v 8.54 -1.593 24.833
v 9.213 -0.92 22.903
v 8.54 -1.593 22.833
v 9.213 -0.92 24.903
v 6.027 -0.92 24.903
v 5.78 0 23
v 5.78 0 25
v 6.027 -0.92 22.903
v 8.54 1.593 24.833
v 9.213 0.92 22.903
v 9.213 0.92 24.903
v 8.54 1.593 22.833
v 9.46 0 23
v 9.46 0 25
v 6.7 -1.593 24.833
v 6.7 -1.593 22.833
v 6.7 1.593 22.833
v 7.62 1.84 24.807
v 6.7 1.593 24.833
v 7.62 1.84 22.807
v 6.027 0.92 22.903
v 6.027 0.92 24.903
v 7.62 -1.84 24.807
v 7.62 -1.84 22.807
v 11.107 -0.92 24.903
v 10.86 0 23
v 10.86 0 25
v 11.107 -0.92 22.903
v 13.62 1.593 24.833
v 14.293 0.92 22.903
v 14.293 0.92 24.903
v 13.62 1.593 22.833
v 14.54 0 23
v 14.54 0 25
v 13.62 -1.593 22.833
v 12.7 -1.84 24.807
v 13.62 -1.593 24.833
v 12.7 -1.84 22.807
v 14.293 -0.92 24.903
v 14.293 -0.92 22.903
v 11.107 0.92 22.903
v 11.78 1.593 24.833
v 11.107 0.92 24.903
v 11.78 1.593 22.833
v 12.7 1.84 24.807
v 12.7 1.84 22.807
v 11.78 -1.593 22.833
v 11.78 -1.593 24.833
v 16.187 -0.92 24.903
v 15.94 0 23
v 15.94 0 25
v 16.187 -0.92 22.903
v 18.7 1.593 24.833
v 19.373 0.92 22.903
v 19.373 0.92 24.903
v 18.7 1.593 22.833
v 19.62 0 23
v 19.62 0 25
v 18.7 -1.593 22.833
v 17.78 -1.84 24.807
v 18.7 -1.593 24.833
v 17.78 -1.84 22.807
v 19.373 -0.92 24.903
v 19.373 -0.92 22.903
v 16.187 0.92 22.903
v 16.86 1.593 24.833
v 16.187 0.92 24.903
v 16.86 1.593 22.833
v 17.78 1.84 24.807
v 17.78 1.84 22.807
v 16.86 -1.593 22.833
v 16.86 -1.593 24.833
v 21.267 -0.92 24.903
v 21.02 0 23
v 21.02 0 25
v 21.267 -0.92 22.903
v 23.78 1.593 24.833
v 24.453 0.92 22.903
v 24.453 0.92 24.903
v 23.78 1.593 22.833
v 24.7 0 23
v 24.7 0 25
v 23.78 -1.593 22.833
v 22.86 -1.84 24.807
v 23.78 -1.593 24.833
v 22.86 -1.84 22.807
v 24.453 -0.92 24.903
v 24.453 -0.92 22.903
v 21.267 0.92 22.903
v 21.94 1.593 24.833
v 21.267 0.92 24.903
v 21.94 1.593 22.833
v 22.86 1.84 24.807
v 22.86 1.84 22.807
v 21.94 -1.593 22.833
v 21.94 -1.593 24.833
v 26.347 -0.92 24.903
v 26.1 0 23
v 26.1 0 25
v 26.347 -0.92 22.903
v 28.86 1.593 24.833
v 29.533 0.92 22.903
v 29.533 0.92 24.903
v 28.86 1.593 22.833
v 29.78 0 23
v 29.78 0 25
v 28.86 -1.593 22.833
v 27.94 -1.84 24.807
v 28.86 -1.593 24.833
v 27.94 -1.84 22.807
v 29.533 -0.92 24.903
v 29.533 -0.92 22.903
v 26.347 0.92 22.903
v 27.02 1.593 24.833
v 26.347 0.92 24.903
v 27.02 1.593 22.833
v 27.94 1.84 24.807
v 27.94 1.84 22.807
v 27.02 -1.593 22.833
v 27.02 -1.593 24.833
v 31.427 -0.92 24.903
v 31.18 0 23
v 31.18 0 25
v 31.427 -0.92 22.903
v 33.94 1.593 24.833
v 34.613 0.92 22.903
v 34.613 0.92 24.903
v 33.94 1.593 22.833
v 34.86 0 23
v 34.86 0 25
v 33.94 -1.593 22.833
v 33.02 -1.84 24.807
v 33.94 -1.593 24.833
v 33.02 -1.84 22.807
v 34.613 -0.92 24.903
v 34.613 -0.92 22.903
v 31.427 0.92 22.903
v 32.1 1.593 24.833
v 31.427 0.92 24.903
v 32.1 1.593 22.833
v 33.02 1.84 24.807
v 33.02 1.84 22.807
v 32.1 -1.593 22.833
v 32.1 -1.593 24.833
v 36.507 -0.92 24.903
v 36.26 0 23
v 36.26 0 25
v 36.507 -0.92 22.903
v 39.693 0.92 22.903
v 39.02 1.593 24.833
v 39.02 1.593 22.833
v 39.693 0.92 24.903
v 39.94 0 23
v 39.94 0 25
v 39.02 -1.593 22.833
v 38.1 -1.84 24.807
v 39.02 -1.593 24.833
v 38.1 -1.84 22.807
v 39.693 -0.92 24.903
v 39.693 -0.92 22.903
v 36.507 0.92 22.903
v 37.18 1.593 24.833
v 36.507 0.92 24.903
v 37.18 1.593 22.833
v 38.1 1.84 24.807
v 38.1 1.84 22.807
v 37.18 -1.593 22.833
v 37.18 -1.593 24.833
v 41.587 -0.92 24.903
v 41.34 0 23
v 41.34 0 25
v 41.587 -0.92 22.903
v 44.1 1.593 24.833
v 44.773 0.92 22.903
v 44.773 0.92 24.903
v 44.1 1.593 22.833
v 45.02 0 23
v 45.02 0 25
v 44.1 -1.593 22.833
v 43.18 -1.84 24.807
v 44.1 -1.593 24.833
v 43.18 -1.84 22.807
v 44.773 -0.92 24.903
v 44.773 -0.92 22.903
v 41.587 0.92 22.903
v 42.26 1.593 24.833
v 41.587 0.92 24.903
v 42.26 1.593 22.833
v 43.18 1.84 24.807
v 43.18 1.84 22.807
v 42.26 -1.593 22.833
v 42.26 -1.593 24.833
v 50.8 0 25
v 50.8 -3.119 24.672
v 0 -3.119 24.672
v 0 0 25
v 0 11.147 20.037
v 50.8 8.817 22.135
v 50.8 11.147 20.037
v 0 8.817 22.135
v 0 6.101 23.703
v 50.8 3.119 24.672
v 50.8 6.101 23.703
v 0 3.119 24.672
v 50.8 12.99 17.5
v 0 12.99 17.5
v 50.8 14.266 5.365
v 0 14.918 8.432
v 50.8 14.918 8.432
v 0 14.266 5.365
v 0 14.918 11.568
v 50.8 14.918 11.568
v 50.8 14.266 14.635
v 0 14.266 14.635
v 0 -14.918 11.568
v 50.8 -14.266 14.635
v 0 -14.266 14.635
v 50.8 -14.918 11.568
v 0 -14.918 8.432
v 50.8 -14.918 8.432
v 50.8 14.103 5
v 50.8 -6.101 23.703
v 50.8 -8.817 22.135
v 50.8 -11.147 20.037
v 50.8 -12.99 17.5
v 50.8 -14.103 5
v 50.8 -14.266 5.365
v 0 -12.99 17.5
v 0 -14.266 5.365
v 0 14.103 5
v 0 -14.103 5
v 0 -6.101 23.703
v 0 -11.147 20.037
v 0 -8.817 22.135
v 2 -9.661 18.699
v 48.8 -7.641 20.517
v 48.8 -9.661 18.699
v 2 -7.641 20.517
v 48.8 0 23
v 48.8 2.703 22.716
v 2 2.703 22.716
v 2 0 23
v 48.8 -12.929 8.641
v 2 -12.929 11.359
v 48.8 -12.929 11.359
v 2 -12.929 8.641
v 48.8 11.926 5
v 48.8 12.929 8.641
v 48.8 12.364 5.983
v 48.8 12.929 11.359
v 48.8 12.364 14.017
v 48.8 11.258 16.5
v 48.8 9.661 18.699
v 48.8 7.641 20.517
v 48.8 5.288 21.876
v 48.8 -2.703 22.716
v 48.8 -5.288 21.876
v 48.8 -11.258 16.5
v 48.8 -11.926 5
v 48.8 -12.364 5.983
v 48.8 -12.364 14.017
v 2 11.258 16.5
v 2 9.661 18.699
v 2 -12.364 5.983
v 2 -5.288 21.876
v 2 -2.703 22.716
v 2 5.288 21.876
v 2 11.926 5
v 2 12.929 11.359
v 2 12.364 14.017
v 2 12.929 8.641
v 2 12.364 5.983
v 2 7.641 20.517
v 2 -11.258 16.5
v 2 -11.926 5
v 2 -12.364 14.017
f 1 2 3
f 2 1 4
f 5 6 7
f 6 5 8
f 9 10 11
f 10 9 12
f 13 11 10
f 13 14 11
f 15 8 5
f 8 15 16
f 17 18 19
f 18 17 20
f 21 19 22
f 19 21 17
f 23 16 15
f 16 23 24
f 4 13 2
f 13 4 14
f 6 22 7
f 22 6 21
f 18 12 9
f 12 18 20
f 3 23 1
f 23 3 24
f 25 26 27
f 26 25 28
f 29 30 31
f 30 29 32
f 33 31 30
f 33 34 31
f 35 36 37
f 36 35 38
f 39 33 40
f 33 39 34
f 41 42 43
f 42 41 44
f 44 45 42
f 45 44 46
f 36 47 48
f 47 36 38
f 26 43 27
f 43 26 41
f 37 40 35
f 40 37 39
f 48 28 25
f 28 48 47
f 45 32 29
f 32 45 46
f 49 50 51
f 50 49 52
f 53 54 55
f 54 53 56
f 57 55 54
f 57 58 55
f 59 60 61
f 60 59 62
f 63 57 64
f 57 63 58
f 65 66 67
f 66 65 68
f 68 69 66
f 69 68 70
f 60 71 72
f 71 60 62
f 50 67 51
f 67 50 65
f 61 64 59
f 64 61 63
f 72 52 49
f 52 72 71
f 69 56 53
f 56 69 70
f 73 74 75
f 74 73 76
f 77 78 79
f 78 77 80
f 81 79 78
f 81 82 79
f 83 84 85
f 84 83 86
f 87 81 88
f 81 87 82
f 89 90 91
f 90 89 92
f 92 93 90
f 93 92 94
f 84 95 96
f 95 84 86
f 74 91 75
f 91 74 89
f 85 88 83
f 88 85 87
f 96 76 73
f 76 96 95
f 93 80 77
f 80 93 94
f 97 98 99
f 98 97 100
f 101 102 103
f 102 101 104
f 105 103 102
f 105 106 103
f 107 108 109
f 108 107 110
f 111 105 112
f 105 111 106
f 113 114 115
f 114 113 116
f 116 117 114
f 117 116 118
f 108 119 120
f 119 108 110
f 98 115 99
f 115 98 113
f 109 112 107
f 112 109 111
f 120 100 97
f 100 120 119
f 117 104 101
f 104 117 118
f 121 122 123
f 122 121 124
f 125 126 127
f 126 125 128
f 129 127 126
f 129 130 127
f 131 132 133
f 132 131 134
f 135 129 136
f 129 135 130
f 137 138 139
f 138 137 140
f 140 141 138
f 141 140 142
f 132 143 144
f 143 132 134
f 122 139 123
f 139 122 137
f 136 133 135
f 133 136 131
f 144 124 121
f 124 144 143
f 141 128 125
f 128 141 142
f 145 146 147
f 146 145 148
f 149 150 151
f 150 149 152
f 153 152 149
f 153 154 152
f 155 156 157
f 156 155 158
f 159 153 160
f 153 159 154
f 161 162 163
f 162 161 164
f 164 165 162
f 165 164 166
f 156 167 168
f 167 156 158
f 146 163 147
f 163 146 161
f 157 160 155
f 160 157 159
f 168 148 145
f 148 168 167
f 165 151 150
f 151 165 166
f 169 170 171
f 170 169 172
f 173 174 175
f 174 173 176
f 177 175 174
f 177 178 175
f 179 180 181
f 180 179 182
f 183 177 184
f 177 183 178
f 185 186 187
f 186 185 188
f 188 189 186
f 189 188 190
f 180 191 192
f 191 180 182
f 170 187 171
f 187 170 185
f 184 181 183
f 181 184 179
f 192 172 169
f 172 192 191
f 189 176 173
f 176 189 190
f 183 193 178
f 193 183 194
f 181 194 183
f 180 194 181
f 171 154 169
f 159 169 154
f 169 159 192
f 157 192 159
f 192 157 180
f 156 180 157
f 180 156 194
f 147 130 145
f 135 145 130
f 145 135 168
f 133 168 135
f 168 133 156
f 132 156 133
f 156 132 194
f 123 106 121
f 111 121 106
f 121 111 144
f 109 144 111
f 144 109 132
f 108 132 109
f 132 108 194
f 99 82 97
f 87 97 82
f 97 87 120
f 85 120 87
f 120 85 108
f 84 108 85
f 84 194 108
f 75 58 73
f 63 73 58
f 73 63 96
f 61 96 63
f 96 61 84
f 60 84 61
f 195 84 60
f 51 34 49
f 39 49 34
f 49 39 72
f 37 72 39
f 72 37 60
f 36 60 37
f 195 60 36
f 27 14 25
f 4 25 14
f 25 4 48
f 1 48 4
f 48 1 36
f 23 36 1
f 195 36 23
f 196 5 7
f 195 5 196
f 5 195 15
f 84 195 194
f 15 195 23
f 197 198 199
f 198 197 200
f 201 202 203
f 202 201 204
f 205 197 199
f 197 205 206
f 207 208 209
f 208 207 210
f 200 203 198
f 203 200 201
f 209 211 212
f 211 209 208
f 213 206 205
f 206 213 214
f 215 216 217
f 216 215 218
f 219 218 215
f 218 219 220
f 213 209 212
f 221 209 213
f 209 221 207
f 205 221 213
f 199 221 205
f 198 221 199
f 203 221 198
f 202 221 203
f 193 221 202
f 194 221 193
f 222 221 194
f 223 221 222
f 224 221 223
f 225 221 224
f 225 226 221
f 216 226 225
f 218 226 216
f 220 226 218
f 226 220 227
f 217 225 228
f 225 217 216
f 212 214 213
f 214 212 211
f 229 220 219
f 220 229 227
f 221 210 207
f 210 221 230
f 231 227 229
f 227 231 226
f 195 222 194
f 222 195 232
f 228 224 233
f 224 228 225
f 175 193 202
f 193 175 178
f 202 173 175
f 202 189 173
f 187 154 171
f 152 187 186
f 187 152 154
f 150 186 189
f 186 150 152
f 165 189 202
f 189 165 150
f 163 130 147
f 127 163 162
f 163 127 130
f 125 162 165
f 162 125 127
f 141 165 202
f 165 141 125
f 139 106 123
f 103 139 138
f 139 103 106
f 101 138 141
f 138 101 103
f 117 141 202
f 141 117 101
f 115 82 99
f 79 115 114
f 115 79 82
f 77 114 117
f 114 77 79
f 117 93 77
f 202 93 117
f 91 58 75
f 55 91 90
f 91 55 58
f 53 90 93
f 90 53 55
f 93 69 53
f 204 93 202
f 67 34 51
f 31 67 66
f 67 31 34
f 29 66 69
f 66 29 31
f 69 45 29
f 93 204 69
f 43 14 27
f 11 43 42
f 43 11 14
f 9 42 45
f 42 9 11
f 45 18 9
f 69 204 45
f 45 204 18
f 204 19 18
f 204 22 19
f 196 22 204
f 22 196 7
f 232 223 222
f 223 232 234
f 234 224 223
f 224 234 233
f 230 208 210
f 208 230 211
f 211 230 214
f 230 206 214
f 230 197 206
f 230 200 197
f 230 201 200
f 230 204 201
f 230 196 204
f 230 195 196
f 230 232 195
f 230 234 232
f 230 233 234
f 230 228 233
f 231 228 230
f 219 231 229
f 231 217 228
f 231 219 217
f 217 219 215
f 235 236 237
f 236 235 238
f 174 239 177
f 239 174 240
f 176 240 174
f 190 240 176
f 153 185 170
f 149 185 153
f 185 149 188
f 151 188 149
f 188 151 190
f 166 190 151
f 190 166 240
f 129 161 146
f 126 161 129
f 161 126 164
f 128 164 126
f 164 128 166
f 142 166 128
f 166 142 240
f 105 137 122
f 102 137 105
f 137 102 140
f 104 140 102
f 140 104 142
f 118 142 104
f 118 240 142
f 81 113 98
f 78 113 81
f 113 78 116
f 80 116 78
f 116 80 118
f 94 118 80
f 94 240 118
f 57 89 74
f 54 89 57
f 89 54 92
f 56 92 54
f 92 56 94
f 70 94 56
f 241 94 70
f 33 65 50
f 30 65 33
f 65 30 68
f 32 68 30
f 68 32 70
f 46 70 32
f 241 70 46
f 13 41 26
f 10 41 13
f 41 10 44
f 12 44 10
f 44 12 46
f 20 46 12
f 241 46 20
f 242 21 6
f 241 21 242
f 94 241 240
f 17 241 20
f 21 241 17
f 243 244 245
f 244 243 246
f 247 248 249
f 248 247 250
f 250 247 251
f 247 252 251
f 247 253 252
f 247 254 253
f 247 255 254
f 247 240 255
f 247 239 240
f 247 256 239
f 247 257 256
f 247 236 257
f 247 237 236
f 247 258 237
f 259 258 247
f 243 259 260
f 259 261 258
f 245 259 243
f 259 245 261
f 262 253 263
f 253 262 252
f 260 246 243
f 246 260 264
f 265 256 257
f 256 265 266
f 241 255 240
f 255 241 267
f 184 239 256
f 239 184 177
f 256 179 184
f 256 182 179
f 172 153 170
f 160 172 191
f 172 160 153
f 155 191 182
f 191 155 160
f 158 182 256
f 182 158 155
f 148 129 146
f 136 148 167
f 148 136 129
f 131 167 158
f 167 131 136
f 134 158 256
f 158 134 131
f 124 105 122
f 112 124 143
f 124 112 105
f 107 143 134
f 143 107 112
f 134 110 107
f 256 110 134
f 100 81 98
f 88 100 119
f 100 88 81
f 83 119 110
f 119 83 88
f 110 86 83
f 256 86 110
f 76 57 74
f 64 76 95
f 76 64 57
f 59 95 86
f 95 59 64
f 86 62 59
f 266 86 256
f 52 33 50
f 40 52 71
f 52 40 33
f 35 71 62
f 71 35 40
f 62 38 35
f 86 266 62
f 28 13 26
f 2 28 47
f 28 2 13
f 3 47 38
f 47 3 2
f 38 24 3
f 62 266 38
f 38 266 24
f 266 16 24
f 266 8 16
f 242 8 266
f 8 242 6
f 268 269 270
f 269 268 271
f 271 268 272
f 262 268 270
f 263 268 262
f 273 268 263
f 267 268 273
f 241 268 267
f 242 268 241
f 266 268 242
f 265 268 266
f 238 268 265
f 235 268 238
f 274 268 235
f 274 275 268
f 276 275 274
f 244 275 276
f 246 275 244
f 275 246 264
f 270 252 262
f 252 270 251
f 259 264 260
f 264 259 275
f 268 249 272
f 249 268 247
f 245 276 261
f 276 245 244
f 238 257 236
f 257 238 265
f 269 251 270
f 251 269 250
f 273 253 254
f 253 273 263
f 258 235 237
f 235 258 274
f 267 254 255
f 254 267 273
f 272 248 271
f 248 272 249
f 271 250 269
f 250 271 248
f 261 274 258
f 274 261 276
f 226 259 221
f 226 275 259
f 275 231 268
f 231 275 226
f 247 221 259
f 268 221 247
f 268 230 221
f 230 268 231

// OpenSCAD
/*
    Housing for leds and controller
*/

hob_radius = 1.84;
hob_spacing = 5.08;

hobs_wide = 8;
hobs_deep = 1;

module led_matrix(wide,deep) {
    height = 5;

    union() {
        for (i = [1 : wide]) {
            for (j = [1 : deep]) {
                translate([i*hob_spacing, j*hob_spacing, 0])
                cylinder(r1 = hob_radius,r2 = hob_radius,$fn = 12,h = height, center=false);
            }
        }

    };
};

case_width = 30;
case_length = (hobs_wide+2)*hob_spacing;
case_thick = 2;
case_slice = case_width / 3;

difference() {
    translate([0,0,case_width/3])
    rotate([0,90,0])
        cylinder(h=case_length, r = case_width/2);
    translate([2,0,case_width/3])
    rotate([0,90,0])
        cylinder(h=case_length-case_thick*2, r = case_width/2 - case_thick);
    translate([-0.5, -case_width/2, -case_width/2 + case_width/3])
        cube([case_length+1, case_width, case_slice]);
    translate([hob_spacing/2,-((hobs_deep+1)*hob_spacing)/2,case_width/2 + case_width/3 - case_thick - 1])
        led_matrix(hobs_wide,hobs_deep);
    *translate([case_thick/3 * 2, -5, -case_width/2 + case_width/3 + case_slice + 1])
        cube([case_length - case_thick*2 + case_thick/3 * 2,10,1]);
};
